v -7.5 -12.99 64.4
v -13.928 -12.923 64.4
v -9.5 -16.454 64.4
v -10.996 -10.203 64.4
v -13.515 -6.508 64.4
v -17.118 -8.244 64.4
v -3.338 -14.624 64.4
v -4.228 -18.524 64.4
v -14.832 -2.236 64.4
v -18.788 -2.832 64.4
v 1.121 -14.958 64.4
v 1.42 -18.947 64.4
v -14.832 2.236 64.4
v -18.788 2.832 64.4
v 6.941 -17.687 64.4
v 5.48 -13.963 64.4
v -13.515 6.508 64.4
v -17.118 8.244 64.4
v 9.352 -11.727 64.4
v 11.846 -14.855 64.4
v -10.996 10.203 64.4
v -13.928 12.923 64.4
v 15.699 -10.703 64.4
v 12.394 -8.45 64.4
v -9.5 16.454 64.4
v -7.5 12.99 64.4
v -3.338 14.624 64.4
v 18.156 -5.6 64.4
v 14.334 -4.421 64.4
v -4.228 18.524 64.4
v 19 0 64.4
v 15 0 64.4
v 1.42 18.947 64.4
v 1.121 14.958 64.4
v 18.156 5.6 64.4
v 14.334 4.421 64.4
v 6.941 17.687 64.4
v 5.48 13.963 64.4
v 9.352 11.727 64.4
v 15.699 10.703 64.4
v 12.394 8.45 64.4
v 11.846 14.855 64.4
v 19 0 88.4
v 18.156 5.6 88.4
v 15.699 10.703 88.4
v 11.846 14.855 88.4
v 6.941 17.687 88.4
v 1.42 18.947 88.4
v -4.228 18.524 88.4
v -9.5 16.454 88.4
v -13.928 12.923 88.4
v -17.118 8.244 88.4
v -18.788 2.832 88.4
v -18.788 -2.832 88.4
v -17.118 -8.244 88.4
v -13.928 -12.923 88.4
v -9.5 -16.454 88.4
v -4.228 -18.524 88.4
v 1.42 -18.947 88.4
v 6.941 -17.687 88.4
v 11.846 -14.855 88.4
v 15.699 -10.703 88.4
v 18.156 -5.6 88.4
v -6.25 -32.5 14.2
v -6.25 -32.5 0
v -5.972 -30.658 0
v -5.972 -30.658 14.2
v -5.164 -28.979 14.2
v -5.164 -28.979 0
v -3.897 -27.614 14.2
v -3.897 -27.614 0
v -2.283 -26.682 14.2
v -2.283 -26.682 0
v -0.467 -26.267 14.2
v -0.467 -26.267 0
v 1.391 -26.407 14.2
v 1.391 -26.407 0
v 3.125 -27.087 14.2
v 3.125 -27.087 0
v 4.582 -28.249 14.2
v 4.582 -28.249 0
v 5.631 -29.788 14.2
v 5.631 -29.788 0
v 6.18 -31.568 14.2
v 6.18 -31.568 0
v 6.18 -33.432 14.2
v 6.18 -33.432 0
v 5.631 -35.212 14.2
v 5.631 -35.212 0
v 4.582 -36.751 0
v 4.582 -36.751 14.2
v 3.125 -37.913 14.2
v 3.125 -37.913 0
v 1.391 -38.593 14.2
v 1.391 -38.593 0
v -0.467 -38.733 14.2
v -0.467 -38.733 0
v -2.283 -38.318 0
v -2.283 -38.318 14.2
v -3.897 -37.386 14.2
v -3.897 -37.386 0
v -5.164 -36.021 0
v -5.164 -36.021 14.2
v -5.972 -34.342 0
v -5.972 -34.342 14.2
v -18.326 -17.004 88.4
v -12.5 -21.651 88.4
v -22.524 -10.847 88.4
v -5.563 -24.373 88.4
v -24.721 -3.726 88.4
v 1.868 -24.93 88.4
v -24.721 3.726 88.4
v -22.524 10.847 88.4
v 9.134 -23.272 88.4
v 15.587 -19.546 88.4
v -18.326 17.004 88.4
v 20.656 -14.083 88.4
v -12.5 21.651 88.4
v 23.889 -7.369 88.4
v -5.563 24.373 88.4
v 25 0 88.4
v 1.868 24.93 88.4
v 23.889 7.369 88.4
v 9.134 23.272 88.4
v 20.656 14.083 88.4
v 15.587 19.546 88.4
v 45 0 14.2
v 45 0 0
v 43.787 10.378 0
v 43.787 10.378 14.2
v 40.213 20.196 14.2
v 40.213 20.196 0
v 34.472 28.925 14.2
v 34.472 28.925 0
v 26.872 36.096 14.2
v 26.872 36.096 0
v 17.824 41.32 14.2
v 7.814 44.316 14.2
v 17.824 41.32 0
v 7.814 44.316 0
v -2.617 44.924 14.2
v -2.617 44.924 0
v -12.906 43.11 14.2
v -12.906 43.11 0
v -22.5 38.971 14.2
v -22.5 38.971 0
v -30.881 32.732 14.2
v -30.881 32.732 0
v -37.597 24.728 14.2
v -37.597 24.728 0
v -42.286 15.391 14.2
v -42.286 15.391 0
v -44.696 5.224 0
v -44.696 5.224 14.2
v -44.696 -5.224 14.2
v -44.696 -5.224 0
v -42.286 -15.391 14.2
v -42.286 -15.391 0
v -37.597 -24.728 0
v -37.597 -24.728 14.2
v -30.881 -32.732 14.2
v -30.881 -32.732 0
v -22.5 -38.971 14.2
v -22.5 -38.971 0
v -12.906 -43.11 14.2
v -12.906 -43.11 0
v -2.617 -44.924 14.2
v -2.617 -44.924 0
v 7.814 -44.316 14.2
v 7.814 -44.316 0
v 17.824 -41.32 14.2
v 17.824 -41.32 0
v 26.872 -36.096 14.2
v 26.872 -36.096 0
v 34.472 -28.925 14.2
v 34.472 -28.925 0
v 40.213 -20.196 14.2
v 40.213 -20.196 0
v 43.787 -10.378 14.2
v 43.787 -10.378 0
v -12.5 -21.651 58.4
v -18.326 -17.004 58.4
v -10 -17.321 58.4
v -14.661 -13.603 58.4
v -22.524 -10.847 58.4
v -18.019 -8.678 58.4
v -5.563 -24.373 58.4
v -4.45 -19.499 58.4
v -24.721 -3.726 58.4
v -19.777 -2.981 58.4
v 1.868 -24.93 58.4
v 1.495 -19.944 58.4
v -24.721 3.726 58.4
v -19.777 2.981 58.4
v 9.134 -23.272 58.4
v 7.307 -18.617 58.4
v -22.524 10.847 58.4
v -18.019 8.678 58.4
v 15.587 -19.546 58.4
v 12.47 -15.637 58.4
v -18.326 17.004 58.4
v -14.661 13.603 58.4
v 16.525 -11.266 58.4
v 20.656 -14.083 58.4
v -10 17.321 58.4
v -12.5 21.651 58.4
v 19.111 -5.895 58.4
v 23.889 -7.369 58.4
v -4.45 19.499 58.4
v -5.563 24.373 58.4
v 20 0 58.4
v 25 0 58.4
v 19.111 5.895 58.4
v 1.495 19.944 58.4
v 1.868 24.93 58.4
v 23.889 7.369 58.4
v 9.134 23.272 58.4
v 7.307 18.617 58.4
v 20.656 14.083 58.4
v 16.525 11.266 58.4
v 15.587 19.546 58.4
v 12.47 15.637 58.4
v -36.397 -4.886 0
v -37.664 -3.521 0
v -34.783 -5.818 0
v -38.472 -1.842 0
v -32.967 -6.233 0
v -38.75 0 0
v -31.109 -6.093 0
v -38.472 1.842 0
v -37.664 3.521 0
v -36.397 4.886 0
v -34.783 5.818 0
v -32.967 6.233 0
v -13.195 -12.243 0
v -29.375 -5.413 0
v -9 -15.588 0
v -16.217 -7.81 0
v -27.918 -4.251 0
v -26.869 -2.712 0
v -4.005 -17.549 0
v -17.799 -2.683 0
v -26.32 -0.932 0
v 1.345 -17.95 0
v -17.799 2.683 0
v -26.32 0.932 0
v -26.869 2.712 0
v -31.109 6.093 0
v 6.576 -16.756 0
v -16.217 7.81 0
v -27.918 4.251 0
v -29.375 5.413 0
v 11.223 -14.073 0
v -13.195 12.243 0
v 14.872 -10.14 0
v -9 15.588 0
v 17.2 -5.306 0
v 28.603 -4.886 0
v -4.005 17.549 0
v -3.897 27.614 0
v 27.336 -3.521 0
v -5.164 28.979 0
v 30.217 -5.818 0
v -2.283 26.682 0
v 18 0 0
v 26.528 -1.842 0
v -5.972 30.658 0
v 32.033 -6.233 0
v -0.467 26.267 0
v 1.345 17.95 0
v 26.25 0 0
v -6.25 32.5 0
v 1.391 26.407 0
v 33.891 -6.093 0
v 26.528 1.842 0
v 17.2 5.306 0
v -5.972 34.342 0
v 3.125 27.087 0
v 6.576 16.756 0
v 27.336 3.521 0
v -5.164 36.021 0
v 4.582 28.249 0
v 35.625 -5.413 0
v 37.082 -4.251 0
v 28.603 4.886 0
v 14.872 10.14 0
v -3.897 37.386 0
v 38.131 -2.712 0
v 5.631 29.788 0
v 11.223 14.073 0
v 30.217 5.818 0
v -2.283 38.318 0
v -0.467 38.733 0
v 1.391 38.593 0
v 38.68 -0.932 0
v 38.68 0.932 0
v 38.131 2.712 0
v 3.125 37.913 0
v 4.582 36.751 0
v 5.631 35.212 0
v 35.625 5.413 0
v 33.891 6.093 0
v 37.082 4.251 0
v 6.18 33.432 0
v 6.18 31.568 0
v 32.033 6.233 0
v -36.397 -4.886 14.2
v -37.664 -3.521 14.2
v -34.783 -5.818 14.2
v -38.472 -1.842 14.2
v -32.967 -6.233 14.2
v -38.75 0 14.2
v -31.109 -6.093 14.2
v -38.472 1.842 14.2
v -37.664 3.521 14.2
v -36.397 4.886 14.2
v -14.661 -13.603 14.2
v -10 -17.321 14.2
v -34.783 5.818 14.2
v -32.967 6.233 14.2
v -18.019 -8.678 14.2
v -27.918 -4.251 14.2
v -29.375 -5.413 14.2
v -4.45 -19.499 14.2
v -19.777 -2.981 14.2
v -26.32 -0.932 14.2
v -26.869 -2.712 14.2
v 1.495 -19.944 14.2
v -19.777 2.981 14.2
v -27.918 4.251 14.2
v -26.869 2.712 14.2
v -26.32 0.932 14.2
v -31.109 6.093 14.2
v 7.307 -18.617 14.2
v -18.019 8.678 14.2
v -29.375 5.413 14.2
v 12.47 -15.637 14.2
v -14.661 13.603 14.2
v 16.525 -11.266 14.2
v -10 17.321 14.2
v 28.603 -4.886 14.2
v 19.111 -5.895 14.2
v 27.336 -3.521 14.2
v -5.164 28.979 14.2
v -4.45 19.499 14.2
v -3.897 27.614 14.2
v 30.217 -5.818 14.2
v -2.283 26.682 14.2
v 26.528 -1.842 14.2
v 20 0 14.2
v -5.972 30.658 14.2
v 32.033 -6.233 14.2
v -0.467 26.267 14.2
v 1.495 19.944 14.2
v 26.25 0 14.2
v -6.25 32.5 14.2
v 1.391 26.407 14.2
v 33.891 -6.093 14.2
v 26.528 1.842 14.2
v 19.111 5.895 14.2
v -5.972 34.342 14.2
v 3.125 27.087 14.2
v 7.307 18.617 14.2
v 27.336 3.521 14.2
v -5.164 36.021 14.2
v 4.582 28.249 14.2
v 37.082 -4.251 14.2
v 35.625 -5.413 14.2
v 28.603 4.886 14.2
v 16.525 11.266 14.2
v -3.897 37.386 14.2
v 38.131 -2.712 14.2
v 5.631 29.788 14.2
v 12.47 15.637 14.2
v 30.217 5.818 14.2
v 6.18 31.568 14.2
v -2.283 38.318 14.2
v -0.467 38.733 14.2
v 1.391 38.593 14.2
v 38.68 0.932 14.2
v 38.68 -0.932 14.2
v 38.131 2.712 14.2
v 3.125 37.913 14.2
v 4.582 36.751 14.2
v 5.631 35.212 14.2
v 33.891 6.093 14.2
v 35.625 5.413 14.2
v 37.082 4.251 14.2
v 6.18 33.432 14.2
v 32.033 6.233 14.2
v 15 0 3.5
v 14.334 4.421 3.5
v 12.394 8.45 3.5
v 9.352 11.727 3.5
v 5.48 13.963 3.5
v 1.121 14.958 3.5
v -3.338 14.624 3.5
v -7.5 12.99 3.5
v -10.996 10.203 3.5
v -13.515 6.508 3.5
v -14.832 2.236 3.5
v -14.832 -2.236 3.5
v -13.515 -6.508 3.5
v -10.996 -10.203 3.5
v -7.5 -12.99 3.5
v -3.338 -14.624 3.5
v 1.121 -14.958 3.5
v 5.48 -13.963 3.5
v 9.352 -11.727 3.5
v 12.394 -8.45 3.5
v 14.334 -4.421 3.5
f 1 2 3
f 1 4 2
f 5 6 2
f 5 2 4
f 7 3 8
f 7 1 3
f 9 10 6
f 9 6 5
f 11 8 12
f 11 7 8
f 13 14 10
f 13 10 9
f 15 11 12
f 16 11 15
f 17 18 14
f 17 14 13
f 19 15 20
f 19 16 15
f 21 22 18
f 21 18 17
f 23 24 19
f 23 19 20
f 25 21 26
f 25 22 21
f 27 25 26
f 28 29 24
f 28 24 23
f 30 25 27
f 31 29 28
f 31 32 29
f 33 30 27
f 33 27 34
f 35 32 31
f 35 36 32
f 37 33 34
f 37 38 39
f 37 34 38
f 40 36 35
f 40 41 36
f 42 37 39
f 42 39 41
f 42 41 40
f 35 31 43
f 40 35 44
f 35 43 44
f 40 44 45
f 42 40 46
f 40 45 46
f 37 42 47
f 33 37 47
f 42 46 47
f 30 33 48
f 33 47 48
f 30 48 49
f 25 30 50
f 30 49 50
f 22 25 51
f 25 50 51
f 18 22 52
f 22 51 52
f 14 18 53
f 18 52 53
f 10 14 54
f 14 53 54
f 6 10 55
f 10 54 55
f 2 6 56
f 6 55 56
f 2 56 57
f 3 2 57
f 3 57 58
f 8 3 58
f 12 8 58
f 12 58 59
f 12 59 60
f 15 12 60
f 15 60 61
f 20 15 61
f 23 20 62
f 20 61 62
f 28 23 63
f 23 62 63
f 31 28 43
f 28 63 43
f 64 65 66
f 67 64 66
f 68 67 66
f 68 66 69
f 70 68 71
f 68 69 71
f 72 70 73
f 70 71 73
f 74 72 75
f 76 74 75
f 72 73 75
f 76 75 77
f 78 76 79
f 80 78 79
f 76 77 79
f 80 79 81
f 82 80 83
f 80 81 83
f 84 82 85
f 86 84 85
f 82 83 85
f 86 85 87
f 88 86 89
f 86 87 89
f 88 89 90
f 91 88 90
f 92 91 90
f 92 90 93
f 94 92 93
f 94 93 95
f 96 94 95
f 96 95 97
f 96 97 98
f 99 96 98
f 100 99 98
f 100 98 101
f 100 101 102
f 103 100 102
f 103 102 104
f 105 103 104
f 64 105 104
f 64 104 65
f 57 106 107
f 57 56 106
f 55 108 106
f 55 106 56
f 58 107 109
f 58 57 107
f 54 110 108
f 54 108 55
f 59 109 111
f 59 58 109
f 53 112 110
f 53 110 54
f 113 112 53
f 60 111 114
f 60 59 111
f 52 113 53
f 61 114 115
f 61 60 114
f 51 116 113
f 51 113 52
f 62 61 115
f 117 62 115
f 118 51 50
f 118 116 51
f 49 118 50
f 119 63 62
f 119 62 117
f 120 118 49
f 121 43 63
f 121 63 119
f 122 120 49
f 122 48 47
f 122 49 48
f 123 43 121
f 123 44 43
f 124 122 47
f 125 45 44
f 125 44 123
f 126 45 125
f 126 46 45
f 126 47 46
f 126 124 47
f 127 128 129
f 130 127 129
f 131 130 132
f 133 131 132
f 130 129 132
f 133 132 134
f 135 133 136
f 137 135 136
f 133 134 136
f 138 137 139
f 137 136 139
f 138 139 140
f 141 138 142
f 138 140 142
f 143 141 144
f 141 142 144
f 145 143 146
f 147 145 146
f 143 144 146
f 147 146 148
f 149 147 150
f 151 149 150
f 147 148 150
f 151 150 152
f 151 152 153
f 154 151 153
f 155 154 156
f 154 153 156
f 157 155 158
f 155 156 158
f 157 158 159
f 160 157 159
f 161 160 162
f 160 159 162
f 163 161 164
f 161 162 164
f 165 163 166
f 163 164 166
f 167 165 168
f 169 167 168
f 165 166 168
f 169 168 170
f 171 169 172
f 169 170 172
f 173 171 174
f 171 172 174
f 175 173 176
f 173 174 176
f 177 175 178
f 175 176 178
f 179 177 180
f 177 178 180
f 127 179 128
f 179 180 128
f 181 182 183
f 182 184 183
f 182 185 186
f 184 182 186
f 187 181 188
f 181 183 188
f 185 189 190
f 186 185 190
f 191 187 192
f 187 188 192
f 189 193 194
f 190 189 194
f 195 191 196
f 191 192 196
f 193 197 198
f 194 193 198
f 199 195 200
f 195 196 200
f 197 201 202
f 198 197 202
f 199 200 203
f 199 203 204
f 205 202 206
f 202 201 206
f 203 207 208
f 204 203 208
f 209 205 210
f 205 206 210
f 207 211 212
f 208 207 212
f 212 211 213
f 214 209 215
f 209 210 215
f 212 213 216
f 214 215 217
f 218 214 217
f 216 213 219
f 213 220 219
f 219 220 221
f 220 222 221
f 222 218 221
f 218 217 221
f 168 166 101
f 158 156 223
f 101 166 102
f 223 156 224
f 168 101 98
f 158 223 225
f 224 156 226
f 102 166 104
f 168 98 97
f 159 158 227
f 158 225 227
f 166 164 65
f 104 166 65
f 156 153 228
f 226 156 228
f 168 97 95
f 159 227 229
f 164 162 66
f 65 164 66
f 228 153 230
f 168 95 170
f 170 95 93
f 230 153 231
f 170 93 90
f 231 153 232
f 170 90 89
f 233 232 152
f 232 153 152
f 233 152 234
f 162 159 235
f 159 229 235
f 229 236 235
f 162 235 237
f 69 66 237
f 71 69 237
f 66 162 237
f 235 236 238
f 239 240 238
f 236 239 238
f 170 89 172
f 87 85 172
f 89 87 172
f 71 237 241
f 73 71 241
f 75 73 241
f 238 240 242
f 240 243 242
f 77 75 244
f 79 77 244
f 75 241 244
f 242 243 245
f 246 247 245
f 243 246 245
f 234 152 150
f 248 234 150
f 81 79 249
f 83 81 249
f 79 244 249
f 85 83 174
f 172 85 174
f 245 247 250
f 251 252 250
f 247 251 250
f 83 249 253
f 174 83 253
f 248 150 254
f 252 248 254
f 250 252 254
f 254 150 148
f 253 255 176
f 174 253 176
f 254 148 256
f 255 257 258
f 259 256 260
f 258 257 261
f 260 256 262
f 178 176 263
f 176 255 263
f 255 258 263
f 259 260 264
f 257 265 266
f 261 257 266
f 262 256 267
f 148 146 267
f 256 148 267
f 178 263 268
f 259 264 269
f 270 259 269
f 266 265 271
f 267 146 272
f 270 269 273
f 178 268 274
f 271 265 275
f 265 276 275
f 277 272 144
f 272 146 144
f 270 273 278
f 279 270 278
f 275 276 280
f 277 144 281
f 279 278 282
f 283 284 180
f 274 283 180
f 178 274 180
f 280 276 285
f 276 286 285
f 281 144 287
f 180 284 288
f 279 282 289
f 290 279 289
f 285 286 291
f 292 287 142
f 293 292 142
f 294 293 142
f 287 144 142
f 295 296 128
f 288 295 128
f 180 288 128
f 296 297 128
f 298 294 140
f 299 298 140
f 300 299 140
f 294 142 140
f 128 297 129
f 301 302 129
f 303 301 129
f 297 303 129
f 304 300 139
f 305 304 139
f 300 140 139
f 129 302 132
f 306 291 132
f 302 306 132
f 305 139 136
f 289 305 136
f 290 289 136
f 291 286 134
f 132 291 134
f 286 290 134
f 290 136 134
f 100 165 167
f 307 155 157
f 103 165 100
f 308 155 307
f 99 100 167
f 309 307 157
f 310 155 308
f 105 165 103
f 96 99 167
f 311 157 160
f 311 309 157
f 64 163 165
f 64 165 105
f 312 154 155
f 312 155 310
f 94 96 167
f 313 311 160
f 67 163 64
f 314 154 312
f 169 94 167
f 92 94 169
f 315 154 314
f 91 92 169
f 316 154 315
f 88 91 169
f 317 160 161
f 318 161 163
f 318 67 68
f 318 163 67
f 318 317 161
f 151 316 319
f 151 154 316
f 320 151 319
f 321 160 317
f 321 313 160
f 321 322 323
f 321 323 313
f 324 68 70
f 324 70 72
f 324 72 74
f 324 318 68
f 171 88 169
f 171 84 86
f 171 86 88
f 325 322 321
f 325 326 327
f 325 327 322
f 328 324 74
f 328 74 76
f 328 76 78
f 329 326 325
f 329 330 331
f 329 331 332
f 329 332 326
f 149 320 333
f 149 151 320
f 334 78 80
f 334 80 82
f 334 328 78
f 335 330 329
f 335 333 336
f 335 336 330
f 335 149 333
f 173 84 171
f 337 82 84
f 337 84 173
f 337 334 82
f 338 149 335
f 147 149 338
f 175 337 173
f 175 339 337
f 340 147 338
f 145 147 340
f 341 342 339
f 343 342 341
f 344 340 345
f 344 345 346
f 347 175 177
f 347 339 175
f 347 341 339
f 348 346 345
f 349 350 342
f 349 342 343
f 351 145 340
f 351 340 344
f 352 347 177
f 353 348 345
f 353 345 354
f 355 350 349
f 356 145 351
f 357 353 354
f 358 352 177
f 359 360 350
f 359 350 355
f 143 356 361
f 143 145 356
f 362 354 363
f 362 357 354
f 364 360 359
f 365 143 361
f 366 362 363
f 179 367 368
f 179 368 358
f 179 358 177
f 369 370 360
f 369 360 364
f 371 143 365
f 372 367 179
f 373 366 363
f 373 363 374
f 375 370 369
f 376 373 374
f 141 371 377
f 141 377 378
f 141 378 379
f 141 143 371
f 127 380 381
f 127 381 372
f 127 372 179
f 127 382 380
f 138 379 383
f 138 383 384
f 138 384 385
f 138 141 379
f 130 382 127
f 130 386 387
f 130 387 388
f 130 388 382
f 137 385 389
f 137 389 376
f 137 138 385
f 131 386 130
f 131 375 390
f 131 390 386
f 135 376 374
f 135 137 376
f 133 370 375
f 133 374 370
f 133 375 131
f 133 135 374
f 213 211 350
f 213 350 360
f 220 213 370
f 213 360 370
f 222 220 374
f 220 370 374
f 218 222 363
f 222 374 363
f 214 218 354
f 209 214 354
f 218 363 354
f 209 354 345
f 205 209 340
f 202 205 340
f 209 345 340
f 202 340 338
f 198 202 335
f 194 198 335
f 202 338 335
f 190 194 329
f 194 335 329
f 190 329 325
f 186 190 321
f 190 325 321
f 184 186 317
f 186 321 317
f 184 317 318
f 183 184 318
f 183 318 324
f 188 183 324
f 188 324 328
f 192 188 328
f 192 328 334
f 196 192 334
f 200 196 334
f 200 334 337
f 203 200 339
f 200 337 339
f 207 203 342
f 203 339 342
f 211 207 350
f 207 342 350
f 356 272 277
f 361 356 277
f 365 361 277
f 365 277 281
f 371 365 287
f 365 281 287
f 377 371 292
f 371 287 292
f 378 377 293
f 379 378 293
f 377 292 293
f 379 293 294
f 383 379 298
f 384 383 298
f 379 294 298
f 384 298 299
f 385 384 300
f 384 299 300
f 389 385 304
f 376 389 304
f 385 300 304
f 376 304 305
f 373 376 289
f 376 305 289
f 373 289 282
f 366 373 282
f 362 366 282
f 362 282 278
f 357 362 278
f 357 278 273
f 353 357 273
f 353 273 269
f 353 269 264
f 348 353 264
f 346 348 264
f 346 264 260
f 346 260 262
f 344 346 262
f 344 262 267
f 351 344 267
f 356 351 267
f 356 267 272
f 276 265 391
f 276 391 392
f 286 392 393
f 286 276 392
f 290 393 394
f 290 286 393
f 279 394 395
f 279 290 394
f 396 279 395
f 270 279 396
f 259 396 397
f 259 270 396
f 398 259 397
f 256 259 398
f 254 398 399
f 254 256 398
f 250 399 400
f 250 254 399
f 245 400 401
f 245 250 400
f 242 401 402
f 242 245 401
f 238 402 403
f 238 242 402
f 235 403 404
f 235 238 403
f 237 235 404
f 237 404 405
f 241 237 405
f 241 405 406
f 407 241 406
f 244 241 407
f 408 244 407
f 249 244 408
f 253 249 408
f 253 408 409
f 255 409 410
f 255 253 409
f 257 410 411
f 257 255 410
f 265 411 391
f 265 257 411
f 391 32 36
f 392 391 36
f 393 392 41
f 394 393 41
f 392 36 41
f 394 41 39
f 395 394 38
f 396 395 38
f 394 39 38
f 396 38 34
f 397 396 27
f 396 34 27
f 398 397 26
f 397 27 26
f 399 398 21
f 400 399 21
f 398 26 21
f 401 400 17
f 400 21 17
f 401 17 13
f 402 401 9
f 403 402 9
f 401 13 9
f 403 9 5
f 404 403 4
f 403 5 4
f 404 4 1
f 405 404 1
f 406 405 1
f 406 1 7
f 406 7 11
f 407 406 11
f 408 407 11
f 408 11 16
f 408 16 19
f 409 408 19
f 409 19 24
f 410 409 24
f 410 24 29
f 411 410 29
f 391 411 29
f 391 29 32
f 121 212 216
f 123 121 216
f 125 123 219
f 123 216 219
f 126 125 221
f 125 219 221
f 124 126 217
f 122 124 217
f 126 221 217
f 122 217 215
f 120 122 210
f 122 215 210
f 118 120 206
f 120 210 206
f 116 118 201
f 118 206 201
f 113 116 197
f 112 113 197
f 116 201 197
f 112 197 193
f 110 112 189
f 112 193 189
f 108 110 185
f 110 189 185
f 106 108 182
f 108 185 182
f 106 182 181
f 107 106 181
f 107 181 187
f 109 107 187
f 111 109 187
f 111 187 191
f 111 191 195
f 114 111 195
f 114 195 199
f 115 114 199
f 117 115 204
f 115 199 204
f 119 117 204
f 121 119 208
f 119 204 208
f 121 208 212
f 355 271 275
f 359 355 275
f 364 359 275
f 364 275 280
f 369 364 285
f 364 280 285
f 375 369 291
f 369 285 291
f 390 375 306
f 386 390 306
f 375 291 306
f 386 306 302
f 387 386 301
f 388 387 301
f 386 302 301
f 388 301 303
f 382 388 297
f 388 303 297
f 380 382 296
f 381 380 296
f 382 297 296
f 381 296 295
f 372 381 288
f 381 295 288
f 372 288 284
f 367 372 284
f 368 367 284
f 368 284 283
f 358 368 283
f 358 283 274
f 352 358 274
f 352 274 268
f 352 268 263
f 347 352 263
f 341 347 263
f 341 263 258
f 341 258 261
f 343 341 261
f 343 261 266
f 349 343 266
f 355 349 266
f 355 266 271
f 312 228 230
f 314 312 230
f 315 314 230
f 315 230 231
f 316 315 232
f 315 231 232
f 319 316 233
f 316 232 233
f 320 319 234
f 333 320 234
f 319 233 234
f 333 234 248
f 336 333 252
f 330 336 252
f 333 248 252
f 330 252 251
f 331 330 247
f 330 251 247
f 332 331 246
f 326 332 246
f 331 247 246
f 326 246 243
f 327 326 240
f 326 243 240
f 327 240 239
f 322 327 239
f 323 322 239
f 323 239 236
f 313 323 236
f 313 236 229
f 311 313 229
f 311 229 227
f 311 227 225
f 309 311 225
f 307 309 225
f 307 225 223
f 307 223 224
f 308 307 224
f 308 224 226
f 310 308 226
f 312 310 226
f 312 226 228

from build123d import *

# Parameters (mm, degrees)
CROQUIS1_R              = 45
SALIENTE_EXTRUIR1_DEPTH = 14.2
CROQUIS2_R              = 20
SALIENTE_EXTRUIR2_DEPTH = 44.2
CROQUIS3_R              = 25
SALIENTE_EXTRUIR3_DEPTH = 30
CROQUIS4_R              = 19
CORTAR_EXTRUIR1_DEPTH   = 24
CROQUIS5_R              = 15
CORTAR_EXTRUIR2_DEPTH   = 84
CHAFL_N1_SIZE           = 3.5
CHAFL_N1_SIZE2          = 3
CROQUIS6_R              = 6.25
CORTAR_EXTRUIR3_DEPTH   = 84


with BuildPart() as part:
    # Croquis1 → Saliente-Extruir1 (new body)
    with BuildSketch(Plane.XY):
        Circle(CROQUIS1_R)
    extrude(amount=SALIENTE_EXTRUIR1_DEPTH)

    # Croquis2 → Saliente-Extruir2 (add)
    with BuildSketch(Plane.XY.offset(14.2)):
        Circle(CROQUIS2_R)
    extrude(amount=SALIENTE_EXTRUIR2_DEPTH)

    # Croquis3 → Saliente-Extruir3 (add)
    with BuildSketch(Plane.XY.offset(58.4)):
        Circle(CROQUIS3_R)
    extrude(amount=SALIENTE_EXTRUIR3_DEPTH)

    # Croquis4 → Cortar-Extruir1 (cut)
    with BuildSketch(Plane.XY.offset(88.4)):
        Circle(CROQUIS4_R)
    extrude(amount=-CORTAR_EXTRUIR1_DEPTH, mode=Mode.SUBTRACT)

    # Croquis5 → Cortar-Extruir2 (cut)
    with BuildSketch(Plane.XY.offset(64.4)):
        Circle(CROQUIS5_R)
    extrude(amount=-CORTAR_EXTRUIR2_DEPTH, mode=Mode.SUBTRACT)

    # Chaflán1
    chafl_n1_edges = [part.edges().sort_by_distance(p)[0] for p in [
        (-15, 0, 0),
    ]]
    chafl_n1_side = [part.faces().sort_by_distance(p)[0] for p in [
        (-15, 0, 32.2),
    ]]
    chamfer(chafl_n1_edges, length=CHAFL_N1_SIZE, length2=CHAFL_N1_SIZE2, reference=chafl_n1_side[0])

    # Croquis6 → Cortar-Extruir3 (cut)
    with BuildSketch(Plane(origin=(0, 0, 0), x_dir=(-1, 0, 0), z_dir=(0, 0, -1))):
        with Locations((0, 32.5)):
            Circle(CROQUIS6_R)
        with Locations((32.5, 0)):
            Circle(CROQUIS6_R)
        with Locations((0, -32.5)):
            Circle(CROQUIS6_R)
        with Locations((-32.5, 0)):
            Circle(CROQUIS6_R)
    extrude(amount=-CORTAR_EXTRUIR3_DEPTH, mode=Mode.SUBTRACT)


solid = part.part
